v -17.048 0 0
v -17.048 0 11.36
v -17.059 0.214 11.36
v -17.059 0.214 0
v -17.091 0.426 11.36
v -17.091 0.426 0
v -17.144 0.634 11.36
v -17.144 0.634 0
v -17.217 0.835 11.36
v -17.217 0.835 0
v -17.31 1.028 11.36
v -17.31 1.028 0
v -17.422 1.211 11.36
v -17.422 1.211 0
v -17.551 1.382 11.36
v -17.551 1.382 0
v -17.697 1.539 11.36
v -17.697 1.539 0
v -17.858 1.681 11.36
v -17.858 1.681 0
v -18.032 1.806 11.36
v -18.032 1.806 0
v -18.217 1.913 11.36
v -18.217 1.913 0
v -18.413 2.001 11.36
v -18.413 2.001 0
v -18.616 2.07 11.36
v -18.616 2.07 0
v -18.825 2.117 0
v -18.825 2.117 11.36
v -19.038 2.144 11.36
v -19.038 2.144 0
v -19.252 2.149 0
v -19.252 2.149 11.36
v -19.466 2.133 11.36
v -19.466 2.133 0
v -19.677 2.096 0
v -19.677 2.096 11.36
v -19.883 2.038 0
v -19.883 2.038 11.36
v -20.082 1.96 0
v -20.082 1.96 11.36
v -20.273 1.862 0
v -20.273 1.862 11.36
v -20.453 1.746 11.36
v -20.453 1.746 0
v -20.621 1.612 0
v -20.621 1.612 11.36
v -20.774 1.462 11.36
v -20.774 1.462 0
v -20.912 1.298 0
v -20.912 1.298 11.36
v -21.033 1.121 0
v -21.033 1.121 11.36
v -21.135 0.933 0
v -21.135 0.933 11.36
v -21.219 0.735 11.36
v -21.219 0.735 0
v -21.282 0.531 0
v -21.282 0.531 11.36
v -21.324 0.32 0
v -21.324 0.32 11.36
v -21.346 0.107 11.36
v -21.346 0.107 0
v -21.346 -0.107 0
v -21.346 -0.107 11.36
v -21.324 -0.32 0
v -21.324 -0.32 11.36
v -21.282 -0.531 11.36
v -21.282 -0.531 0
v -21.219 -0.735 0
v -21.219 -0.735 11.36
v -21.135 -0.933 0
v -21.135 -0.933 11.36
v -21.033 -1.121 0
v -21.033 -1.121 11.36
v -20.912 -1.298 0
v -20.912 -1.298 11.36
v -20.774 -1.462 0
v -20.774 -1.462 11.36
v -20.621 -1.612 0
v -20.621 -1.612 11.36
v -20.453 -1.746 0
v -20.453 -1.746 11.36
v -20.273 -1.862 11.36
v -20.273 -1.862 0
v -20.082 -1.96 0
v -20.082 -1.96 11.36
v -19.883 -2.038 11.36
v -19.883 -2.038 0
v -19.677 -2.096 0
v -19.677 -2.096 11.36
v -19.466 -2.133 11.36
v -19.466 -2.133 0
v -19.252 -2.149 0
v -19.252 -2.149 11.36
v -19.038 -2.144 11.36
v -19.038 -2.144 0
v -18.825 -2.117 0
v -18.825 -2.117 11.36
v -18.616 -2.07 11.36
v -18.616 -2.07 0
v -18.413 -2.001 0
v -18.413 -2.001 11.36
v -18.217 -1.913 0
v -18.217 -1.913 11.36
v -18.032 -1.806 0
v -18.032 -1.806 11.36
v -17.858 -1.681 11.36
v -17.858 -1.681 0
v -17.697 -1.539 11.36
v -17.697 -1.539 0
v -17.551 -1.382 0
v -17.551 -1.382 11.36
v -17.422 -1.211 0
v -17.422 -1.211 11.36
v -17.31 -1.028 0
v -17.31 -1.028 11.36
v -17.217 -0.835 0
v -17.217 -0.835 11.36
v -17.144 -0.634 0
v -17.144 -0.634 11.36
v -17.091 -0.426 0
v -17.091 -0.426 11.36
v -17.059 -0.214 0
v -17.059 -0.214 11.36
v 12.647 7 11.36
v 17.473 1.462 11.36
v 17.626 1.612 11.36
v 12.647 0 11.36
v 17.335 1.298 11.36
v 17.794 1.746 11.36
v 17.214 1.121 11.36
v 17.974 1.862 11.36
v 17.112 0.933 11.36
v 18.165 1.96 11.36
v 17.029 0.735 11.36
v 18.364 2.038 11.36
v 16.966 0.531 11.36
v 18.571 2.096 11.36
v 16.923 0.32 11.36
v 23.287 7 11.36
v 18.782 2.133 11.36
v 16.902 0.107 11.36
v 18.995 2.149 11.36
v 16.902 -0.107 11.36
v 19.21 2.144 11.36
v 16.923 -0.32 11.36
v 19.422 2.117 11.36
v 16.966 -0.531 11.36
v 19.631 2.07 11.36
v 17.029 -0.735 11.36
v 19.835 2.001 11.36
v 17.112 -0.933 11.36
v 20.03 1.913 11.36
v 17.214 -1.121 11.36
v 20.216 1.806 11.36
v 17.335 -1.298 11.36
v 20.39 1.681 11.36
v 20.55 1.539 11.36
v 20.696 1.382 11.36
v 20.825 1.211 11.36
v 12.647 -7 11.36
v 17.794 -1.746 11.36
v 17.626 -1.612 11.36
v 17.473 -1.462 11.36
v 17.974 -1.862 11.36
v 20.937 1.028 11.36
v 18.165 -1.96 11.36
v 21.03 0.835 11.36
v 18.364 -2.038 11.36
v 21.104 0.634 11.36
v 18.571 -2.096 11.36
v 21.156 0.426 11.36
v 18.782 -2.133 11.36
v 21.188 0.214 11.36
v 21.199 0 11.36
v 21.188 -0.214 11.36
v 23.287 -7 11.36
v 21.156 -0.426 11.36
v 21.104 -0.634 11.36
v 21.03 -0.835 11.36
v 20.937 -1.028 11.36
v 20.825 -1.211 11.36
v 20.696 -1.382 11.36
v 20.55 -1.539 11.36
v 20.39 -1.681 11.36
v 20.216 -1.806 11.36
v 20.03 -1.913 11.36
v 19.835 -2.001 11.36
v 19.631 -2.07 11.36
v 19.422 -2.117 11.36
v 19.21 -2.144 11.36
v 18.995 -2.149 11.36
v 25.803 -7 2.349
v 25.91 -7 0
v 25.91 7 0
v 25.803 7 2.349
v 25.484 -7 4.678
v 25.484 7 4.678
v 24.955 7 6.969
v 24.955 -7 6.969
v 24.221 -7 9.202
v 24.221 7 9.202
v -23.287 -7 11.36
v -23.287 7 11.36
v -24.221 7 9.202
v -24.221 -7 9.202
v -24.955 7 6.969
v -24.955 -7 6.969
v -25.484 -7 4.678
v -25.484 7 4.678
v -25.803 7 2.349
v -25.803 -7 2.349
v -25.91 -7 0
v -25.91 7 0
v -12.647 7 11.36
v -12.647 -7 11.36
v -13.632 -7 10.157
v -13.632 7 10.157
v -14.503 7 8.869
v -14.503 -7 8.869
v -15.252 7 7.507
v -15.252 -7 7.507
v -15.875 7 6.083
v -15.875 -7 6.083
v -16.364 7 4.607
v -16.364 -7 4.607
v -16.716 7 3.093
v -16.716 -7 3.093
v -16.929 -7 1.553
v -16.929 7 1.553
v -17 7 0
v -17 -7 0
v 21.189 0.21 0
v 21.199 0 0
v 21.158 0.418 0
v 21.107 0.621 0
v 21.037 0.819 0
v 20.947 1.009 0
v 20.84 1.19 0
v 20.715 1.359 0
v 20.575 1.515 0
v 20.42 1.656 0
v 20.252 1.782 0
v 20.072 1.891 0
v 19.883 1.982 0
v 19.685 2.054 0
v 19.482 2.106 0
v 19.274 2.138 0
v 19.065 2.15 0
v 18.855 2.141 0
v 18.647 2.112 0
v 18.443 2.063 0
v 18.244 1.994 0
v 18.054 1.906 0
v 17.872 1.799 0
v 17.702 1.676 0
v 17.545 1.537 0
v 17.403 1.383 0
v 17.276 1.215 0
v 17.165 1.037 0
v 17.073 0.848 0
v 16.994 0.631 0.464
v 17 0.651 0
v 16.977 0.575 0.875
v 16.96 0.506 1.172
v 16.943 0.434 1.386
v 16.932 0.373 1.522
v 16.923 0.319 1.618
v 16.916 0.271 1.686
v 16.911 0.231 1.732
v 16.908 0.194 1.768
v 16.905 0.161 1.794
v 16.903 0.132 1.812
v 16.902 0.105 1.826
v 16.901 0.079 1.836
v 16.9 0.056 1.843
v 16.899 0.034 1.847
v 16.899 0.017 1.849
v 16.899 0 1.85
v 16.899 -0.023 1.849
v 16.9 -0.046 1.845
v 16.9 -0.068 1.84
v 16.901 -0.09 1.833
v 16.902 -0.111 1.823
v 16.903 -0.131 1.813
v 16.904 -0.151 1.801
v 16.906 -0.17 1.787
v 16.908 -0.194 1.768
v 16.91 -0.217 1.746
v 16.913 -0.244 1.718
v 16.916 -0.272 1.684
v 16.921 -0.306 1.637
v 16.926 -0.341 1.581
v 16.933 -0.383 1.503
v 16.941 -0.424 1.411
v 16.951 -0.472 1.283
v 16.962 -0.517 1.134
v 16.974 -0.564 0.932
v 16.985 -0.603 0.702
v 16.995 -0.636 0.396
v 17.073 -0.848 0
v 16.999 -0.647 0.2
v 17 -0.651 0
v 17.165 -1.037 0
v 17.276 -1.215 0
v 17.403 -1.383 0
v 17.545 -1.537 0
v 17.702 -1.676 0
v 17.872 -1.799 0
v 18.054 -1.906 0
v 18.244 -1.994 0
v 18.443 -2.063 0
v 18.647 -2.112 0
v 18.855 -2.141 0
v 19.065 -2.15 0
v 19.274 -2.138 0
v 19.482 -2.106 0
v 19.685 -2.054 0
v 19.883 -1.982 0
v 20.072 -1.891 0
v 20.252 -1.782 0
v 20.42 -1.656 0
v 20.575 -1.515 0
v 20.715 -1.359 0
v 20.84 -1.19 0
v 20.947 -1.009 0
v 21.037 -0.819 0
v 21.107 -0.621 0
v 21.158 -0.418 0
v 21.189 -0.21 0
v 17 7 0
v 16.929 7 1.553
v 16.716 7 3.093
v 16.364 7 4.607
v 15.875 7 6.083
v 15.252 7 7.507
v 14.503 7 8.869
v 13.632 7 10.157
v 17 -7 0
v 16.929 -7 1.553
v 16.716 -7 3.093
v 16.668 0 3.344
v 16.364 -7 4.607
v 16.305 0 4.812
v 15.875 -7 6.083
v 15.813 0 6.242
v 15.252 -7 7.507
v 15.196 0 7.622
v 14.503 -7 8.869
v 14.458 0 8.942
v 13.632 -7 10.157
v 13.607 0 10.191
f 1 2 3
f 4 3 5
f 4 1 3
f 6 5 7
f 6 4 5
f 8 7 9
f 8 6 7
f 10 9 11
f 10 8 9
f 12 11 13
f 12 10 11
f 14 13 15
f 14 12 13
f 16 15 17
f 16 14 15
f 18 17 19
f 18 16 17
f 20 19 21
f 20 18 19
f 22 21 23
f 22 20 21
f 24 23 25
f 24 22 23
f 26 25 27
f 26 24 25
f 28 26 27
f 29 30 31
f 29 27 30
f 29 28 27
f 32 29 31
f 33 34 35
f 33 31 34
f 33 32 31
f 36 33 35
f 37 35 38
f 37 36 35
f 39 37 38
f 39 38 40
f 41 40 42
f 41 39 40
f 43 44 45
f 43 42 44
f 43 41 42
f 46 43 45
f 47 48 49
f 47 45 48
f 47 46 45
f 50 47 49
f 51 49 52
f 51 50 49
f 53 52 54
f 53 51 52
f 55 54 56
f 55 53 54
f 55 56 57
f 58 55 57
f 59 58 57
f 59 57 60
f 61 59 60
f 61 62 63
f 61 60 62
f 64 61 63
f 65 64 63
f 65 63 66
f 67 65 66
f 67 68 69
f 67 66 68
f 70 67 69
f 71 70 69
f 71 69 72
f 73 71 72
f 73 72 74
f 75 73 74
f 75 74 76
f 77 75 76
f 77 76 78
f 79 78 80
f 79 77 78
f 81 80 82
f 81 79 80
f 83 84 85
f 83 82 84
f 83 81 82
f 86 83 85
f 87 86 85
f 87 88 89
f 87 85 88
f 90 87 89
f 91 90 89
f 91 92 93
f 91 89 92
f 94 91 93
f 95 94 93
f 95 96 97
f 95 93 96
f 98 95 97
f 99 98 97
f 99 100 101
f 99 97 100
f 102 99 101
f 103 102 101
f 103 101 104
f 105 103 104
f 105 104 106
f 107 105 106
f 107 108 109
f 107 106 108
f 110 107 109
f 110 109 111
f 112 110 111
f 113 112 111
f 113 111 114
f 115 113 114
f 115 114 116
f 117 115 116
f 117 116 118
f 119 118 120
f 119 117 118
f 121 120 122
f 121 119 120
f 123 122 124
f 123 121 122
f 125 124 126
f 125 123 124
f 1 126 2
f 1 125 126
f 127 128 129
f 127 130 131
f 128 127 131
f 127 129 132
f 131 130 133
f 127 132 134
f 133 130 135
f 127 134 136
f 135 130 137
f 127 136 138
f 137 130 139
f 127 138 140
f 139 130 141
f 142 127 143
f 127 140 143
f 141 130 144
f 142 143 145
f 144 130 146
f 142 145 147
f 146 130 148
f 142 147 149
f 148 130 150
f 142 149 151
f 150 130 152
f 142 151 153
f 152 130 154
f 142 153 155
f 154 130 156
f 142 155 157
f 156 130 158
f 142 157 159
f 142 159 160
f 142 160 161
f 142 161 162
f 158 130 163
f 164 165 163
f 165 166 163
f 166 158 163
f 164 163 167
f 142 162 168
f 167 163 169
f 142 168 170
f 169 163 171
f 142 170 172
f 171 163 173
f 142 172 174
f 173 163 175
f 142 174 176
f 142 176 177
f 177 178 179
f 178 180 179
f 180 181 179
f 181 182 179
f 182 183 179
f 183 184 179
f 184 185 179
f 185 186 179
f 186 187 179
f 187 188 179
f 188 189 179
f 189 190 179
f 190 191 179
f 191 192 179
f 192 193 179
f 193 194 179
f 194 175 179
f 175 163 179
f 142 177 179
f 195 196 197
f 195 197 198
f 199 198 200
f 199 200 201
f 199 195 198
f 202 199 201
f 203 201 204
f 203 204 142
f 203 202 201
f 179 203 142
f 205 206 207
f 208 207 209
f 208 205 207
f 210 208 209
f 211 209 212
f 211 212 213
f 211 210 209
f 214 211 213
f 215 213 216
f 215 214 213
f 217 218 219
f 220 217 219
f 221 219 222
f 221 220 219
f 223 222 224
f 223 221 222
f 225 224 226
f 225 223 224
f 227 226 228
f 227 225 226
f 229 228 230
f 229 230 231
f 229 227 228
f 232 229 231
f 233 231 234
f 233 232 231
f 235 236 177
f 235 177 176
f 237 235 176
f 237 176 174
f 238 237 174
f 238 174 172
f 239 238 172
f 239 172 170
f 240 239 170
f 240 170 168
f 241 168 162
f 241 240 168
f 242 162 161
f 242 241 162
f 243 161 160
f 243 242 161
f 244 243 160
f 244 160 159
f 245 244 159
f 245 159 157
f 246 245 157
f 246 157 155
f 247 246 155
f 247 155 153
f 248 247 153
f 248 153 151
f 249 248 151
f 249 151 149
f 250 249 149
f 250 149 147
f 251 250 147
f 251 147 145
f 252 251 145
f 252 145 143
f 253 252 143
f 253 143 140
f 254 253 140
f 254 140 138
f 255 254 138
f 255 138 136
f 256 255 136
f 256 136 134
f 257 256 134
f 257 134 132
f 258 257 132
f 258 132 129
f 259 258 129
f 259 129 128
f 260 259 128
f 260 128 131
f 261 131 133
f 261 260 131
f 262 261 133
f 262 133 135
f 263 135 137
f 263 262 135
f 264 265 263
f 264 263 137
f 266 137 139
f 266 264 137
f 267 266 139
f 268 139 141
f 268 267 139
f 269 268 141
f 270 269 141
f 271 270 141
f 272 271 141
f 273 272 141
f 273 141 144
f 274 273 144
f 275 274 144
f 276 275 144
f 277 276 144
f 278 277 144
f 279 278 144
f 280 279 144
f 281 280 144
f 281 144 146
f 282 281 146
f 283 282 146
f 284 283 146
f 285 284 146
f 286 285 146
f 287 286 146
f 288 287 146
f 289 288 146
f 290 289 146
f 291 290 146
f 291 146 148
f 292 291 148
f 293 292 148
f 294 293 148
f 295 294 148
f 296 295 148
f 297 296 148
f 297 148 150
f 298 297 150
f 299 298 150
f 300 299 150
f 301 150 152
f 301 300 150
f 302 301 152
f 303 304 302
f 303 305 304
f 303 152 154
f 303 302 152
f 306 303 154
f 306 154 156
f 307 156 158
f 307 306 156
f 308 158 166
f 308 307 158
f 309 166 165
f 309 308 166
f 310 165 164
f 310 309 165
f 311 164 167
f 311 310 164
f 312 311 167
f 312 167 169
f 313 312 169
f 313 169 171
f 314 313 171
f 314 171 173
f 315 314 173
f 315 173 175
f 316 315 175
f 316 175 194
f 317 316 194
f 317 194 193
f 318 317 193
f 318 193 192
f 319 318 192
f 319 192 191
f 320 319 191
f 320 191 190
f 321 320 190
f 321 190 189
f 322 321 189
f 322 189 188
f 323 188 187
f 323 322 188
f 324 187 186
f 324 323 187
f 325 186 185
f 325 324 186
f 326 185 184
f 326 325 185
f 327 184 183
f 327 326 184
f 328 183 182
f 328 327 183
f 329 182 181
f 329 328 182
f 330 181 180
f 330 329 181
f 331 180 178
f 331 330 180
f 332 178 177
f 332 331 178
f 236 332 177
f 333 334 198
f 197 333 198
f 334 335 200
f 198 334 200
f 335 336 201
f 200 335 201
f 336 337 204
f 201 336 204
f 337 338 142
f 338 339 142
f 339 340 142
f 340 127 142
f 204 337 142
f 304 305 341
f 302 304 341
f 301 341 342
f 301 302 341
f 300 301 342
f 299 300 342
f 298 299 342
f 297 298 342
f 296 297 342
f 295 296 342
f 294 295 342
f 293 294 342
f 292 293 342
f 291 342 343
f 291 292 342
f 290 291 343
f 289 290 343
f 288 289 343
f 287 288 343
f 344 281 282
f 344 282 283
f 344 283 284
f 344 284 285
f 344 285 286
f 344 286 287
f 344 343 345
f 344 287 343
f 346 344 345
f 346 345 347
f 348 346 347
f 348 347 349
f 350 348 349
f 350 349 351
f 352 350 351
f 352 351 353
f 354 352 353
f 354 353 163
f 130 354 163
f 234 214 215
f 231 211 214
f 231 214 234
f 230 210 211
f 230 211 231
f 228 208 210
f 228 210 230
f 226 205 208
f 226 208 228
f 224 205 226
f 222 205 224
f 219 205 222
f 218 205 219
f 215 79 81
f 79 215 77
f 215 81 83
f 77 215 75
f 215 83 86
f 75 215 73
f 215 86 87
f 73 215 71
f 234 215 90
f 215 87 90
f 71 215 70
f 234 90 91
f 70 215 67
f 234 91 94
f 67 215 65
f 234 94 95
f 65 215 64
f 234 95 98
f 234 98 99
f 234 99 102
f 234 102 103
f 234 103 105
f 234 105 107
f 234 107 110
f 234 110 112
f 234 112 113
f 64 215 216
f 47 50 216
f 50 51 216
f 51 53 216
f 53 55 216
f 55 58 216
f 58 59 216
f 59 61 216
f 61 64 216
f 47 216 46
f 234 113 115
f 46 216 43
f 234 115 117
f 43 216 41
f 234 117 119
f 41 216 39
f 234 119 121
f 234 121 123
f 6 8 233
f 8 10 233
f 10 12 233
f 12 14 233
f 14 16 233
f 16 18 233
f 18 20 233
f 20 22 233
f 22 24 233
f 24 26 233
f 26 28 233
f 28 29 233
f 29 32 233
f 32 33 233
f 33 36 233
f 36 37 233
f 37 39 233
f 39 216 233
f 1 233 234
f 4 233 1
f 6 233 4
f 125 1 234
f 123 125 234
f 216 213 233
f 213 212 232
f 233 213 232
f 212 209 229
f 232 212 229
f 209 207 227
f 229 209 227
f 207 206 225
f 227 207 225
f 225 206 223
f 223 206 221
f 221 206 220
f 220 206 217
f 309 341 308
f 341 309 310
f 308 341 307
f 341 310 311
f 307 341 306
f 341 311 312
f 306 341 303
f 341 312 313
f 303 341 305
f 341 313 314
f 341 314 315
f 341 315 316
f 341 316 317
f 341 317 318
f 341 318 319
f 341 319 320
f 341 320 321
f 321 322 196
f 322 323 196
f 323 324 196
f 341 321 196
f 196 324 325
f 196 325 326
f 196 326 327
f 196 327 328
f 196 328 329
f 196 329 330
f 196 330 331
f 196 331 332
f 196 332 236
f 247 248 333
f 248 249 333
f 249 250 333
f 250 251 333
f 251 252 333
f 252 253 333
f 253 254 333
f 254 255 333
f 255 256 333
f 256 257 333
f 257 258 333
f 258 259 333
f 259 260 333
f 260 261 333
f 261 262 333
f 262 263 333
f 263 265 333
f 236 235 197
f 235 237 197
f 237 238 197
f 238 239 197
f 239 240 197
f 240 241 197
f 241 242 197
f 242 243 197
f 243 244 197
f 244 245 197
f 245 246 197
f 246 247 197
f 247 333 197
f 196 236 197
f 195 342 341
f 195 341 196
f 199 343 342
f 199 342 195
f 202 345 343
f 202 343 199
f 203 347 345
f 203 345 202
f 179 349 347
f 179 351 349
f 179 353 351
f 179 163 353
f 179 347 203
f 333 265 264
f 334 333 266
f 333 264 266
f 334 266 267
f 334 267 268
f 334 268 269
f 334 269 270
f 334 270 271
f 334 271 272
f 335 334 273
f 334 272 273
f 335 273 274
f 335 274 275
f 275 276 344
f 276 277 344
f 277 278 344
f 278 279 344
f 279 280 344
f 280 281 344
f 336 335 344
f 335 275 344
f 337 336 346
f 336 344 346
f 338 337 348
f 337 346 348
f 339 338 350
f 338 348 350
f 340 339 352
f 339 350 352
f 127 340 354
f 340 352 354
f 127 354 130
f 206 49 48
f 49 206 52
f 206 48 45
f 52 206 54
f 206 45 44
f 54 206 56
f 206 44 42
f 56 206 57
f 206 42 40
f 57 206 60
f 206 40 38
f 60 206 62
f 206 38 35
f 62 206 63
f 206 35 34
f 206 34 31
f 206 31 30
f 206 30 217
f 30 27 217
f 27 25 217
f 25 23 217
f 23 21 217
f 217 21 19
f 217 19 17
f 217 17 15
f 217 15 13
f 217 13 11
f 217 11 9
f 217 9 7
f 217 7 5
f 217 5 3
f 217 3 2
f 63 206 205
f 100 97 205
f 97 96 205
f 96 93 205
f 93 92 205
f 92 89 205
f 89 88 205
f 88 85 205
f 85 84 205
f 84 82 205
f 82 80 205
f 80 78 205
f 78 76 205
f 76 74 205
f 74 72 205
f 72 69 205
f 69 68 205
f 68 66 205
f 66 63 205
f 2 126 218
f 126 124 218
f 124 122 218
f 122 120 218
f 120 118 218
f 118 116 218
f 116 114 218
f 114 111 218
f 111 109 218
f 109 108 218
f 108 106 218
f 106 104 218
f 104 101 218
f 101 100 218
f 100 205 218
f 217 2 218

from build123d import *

# Parameters (mm, degrees)
F0_R          = 25.91
F1_DEPTH      = 7
F1_DEPTH_BACK = 7
F2_R          = 17
F3_DEPTH      = 7
F3_DEPTH_BACK = 7
F5_W          = 10
F5_H          = 14
F6_DEPTH      = 20
F7_R          = 2.15
F8_DEPTH      = 30
F8_DEPTH_BACK = 30
F9_W          = 14
F9_H          = 14
F10_DEPTH     = 3
F14_W         = 122.705668211
F14_H         = 84.9680826068
F15_DEPTH     = 18
F16_W         = 70.5849379301
F16_H         = 46.2428703904
F17_DEPTH     = 30


with BuildPart() as f1:
    # F0 (on Front) → F1 (new body, two sides)
    with BuildSketch(Plane.XZ) as f1_sk:
        Circle(F0_R)
    extrude(amount=F1_DEPTH)
    extrude(f1_sk.sketch, amount=-F1_DEPTH_BACK)

    # F2 (on Front) → F3 (cut, two sides)
    with BuildSketch(Plane.XZ) as f3_sk:
        Circle(F2_R)
    extrude(amount=-F3_DEPTH, mode=Mode.SUBTRACT)
    extrude(f3_sk.sketch, amount=F3_DEPTH_BACK, mode=Mode.SUBTRACT)

    # F5 (on face) → F6 (join)
    with BuildSketch(Plane.XY):
        with Locations((-20.91, 0)):
            Rectangle(F5_W, F5_H)
        with Locations((20.91, 0)):
            Rectangle(F5_W, F5_H)
    extrude(amount=-F6_DEPTH)

    # F7 (on face) → F8 (cut, two sides)
    with BuildSketch(Plane.XY) as f8_sk:
        with Locations((-19.1982129737, 0)):
            Circle(F7_R)
        with Locations((19.0490627756, 0)):
            Circle(F7_R)
    extrude(amount=F8_DEPTH, mode=Mode.SUBTRACT)
    extrude(f8_sk.sketch, amount=-F8_DEPTH_BACK, mode=Mode.SUBTRACT)

    # F9 (on face) → F10 (cut)
    with BuildSketch(Plane(origin=(0, 0, -20), x_dir=(1, 0, 0), z_dir=(0, 0, -1))):
        with Locations((-18.91, 0)):
            Rectangle(F9_W, F9_H)
        with Locations((18.91, 0)):
            Rectangle(F9_W, F9_H)
    extrude(amount=F10_DEPTH, mode=Mode.SUBTRACT)

    # F14 (on 3pt) → F15 (cut)
    with BuildSketch(Plane(origin=(0, 0, 11.36), x_dir=(1, 0, 0), z_dir=(0, 0, -1))):
        with Locations((8.9623853564, -3.6773085594)):
            Rectangle(F14_W, F14_H)
    extrude(amount=-F15_DEPTH, mode=Mode.SUBTRACT)

    # F16 (on face) → F17 (cut)
    with BuildSketch(Plane.XY):
        with Locations((0.332955271, 0.6083846092)):
            Rectangle(F16_W, F16_H)
    extrude(amount=-F17_DEPTH, mode=Mode.SUBTRACT)


solid = f1.part
